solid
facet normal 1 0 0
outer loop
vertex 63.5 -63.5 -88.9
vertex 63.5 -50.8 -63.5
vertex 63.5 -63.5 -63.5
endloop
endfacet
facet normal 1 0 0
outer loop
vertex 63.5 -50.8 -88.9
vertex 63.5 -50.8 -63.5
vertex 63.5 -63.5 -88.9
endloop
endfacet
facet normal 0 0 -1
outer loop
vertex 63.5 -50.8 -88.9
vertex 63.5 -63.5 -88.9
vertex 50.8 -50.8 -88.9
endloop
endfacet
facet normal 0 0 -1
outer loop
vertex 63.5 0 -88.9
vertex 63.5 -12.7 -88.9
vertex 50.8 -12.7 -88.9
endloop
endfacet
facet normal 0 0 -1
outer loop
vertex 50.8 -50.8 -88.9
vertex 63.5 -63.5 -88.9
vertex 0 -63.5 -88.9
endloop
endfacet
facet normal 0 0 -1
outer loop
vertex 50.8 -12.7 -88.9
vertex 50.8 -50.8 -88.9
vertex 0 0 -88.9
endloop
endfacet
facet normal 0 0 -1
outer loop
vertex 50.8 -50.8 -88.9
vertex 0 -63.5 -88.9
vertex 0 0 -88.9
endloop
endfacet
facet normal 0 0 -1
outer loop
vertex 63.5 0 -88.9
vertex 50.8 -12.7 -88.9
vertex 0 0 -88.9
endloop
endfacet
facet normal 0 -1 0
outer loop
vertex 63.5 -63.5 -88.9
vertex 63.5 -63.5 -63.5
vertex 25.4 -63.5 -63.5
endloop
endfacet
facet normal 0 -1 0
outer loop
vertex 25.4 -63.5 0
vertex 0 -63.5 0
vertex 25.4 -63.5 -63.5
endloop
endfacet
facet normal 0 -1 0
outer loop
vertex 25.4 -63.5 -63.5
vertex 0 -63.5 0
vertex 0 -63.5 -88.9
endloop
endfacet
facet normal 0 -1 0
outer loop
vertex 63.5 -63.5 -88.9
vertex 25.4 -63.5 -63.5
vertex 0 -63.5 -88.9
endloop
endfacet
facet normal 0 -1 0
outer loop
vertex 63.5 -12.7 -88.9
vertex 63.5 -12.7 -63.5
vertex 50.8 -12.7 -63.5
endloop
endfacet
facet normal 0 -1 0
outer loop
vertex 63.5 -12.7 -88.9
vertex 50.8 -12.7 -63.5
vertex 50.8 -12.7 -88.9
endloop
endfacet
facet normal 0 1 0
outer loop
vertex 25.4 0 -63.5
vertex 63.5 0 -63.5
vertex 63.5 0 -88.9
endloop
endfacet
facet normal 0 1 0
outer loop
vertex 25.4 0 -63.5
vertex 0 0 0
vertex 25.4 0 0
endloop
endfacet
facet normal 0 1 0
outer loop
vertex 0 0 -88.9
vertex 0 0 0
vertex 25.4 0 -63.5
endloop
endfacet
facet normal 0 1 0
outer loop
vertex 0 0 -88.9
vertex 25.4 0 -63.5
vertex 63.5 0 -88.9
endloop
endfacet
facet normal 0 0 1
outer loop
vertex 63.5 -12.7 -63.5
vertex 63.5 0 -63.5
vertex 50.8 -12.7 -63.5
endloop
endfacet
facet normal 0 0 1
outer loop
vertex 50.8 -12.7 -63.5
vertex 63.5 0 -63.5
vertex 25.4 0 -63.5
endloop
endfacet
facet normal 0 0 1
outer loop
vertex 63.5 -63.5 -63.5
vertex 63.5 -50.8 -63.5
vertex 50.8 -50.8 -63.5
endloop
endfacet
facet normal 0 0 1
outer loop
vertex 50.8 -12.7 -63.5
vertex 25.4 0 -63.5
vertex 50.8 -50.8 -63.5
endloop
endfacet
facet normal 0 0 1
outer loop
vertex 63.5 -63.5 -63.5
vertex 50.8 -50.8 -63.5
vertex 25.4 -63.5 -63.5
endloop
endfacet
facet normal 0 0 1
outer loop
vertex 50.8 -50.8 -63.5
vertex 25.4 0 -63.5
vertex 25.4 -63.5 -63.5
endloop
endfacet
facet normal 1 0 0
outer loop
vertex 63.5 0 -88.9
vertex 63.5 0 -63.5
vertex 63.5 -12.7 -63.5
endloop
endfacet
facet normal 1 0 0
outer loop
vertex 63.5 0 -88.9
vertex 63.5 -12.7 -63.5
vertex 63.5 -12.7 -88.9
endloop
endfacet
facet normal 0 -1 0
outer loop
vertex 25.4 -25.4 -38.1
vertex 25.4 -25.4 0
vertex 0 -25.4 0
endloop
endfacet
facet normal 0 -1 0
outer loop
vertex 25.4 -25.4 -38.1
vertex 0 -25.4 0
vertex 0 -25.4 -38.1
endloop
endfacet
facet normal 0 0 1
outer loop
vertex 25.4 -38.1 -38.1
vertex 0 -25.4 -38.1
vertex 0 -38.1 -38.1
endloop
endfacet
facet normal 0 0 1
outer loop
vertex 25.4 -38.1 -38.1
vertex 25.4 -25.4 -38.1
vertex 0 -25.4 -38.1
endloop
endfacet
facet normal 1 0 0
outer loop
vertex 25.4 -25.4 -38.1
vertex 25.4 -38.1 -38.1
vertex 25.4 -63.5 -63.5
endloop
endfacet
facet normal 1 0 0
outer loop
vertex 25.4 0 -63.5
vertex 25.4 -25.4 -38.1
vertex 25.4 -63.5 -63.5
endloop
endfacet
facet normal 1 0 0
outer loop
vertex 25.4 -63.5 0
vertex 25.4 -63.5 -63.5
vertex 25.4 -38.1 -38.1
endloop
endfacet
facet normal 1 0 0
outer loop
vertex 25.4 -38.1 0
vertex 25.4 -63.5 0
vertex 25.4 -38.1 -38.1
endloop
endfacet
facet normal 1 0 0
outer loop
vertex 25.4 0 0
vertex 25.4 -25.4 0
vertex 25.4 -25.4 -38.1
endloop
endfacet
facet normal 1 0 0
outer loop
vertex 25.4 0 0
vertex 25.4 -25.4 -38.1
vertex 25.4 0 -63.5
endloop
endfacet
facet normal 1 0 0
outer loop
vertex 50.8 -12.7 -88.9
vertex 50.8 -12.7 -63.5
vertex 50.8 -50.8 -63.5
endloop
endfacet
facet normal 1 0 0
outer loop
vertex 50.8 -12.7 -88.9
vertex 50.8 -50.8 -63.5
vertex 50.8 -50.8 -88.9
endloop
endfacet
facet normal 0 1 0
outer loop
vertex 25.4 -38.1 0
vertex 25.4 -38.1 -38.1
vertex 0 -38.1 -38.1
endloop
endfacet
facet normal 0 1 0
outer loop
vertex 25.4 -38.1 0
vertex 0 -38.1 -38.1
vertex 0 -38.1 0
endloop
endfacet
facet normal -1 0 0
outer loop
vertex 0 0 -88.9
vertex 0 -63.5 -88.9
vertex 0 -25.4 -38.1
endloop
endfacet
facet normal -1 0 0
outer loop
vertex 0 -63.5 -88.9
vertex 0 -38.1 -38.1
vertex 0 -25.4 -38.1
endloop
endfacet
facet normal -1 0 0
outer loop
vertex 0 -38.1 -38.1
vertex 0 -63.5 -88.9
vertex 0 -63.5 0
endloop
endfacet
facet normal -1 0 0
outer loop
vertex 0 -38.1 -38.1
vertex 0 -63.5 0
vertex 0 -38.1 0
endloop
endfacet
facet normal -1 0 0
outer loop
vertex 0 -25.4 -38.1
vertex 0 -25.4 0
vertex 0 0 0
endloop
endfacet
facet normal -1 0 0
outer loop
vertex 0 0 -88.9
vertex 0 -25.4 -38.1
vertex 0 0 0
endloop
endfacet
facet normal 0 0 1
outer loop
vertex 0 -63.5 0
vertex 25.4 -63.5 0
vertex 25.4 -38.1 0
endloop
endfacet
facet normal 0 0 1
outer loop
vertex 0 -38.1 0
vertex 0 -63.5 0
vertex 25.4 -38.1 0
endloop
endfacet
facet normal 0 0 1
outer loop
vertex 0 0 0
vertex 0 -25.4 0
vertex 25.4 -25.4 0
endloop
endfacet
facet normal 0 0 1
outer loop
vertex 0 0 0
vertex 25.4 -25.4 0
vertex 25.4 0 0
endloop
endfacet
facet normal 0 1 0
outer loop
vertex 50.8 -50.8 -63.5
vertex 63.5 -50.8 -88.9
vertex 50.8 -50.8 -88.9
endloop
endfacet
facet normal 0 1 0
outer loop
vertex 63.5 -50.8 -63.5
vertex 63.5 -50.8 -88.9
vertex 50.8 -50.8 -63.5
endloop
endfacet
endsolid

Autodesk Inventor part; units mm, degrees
ref_plane "YZ Plane" through (0, 0, 0) normal (1, 0, 0) x (0, 1, 0)
ref_plane "XZ Plane" through (0, 0, 0) normal (0, 1, 0) x (-1, 0, 0)
ref_plane "XY Plane" through (0, 0, 0) normal (0, 0, 1) x (1, 0, 0)
sketch "Sketch1" plane through (0, 0, 0) normal (1, 0, 0) x (0, 1, 0)
  line L0 (0, 0) -> (0, -88.9)
  line L1 (0, -88.9) -> (-63.5, -88.9)
  line L2 (-63.5, -88.9) -> (-63.5, 0)
  line L3 (-63.5, 0) -> (0, 0)
  dimension "d0" = 88.9
  dimension "d1" = 63.5
extrude "Extrusion1" add sketch "Sketch1" along normal blind 25.4
sketch "Sketch2" plane through (25.4, 0, 0) normal (1, 0, 0) x (0, 0, -1)
  point P0 (0, 0)
sketch "Sketch3" plane through (25.4, 0, 0) normal (1, 0, 0) x (0, 0, -1)
  line L0 (0, 0) -> (0, -63.5) projected
  line L1 (0, -25.4) -> (38.1, -25.4)
  line L2 (38.1, -25.4) -> (38.1, -38.1)
  line L3 (38.1, -38.1) -> (0, -38.1)
  line L4 (0, -25.4) -> (0, -38.1)
  dimension "d4" = 25.4
  dimension "d5" = 38.1
  dimension "d6" = 12.7
extrude "Extrusion2" cut sketch "Sketch3" against normal blind 25.4
sketch "Sketch4" plane through (25.4, 0, 0) normal (1, 0, 0) x (0, 0, -1)
  line L0 (0, 0) -> (88.9, 0) projected
  line L1 (88.9, 0) -> (63.5, 0)
  line L2 (63.5, 0) -> (63.5, -63.5)
  line L3 (0, -63.5) -> (88.9, -63.5) projected
  line L4 (63.5, -63.5) -> (88.9, -63.5)
  line L5 (88.9, -63.5) -> (88.9, 0)
  dimension "d9" = 25.4
extrude "Extrusion3" add sketch "Sketch4" along normal blind 38.1
sketch "Sketch5" plane through (63.5, 0, 0) normal (1, 0, 0) x (0, 0, -1)
  point P0 (0, 0)
sketch "Sketch6" plane through (63.5, 0, 0) normal (1, 0, 0) x (0, 0, -1)
  line L0 (63.5, -12.7) -> (88.9, -12.7)
  line L1 (88.9, -12.7) -> (88.9, -50.8)
  line L2 (88.9, -63.5) -> (88.9, 0) projected
  line L3 (88.9, -50.8) -> (63.5, -50.8)
  line L4 (63.5, -63.5) -> (63.5, 0) projected
  line L5 (63.5, -12.7) -> (63.5, -50.8)
  point P0 (0, 0)
  dimension "d12" = 12.7
  dimension "d13" = 38.1
extrude "Extrusion4" cut sketch "Sketch6" against normal blind 12.7
properties part number "Model Creation 3"
